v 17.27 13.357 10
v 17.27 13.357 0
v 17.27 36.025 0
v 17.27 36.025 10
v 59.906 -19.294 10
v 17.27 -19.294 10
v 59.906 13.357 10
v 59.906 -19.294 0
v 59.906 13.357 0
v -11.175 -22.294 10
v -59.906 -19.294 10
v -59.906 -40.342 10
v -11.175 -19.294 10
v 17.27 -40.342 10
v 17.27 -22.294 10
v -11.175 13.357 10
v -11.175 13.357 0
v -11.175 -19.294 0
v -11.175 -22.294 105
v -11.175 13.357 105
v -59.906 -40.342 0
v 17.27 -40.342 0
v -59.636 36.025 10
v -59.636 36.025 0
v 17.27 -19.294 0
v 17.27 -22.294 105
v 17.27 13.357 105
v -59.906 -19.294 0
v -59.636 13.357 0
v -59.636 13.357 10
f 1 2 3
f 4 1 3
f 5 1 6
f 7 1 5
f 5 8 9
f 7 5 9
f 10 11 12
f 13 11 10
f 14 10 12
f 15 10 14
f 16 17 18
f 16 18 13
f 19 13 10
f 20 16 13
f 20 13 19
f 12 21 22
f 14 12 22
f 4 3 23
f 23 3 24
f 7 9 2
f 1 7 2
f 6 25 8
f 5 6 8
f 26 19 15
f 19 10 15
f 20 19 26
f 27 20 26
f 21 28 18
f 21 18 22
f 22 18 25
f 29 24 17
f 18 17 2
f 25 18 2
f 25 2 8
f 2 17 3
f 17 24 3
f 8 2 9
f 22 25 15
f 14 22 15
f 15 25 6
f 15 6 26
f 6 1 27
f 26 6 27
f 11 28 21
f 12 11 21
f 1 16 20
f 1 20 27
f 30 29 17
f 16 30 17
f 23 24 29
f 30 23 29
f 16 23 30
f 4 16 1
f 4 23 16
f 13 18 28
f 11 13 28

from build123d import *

# Parameters (mm, degrees)
F1_DEPTH = 10
F2_DEPTH = 15
F3_W     = 28.4455648065
F3_H     = 32.6516358182
F4_DEPTH = 50
F5_DEPTH = 45
F6_DEPTH = 3


with BuildPart() as f1:
    # F0 (on Top) → F1 (new body)
    with BuildSketch(Plane.XY):
        Polygon((17.2702856362, 36.0247381032), (-59.6364587545, 36.0247381032), (-59.6364587545, 13.3574875072), (-26.1752791703, 13.3574875072), (-26.1752791703, -19.294148311), (-59.9063038826, -19.294148311), (-59.9063038826, -40.3423085809), (17.2702856362, -40.3423085809), (17.2702856362, -19.294148311), (59.9063113332, -19.294148311), (59.9063113332, 13.3574875072), (17.2702856362, 13.3574875072), align=None)
    extrude(amount=F1_DEPTH)

    # F2 (cut): a face of the model
    f2_faces = [f1.faces().sort_by_distance(p)[0] for p in [
        (-26.1752791703, -2.9683304019, 5),
    ]]
    extrude(f2_faces, amount=-F2_DEPTH, mode=Mode.SUBTRACT)

    # F3 (on face) → F4 (join)
    with BuildSketch(Plane.XY.offset(10)):
        with Locations((3.047503233, -2.9683304019)):
            Rectangle(F3_W, F3_H)
    extrude(amount=F4_DEPTH)

    # F5 (add): a face of the model
    f5_faces = [f1.faces().sort_by_distance(p)[0] for p in [
        (3.047503233, -2.9683304019, 60),
    ]]
    extrude(f5_faces, amount=F5_DEPTH)

    # F6 (add): a face of the model
    f6_faces = [f1.faces().sort_by_distance(p)[0] for p in [
        (3.047503233, -19.294148311, 57.5),
    ]]
    extrude(f6_faces, amount=F6_DEPTH)


solid = f1.part
